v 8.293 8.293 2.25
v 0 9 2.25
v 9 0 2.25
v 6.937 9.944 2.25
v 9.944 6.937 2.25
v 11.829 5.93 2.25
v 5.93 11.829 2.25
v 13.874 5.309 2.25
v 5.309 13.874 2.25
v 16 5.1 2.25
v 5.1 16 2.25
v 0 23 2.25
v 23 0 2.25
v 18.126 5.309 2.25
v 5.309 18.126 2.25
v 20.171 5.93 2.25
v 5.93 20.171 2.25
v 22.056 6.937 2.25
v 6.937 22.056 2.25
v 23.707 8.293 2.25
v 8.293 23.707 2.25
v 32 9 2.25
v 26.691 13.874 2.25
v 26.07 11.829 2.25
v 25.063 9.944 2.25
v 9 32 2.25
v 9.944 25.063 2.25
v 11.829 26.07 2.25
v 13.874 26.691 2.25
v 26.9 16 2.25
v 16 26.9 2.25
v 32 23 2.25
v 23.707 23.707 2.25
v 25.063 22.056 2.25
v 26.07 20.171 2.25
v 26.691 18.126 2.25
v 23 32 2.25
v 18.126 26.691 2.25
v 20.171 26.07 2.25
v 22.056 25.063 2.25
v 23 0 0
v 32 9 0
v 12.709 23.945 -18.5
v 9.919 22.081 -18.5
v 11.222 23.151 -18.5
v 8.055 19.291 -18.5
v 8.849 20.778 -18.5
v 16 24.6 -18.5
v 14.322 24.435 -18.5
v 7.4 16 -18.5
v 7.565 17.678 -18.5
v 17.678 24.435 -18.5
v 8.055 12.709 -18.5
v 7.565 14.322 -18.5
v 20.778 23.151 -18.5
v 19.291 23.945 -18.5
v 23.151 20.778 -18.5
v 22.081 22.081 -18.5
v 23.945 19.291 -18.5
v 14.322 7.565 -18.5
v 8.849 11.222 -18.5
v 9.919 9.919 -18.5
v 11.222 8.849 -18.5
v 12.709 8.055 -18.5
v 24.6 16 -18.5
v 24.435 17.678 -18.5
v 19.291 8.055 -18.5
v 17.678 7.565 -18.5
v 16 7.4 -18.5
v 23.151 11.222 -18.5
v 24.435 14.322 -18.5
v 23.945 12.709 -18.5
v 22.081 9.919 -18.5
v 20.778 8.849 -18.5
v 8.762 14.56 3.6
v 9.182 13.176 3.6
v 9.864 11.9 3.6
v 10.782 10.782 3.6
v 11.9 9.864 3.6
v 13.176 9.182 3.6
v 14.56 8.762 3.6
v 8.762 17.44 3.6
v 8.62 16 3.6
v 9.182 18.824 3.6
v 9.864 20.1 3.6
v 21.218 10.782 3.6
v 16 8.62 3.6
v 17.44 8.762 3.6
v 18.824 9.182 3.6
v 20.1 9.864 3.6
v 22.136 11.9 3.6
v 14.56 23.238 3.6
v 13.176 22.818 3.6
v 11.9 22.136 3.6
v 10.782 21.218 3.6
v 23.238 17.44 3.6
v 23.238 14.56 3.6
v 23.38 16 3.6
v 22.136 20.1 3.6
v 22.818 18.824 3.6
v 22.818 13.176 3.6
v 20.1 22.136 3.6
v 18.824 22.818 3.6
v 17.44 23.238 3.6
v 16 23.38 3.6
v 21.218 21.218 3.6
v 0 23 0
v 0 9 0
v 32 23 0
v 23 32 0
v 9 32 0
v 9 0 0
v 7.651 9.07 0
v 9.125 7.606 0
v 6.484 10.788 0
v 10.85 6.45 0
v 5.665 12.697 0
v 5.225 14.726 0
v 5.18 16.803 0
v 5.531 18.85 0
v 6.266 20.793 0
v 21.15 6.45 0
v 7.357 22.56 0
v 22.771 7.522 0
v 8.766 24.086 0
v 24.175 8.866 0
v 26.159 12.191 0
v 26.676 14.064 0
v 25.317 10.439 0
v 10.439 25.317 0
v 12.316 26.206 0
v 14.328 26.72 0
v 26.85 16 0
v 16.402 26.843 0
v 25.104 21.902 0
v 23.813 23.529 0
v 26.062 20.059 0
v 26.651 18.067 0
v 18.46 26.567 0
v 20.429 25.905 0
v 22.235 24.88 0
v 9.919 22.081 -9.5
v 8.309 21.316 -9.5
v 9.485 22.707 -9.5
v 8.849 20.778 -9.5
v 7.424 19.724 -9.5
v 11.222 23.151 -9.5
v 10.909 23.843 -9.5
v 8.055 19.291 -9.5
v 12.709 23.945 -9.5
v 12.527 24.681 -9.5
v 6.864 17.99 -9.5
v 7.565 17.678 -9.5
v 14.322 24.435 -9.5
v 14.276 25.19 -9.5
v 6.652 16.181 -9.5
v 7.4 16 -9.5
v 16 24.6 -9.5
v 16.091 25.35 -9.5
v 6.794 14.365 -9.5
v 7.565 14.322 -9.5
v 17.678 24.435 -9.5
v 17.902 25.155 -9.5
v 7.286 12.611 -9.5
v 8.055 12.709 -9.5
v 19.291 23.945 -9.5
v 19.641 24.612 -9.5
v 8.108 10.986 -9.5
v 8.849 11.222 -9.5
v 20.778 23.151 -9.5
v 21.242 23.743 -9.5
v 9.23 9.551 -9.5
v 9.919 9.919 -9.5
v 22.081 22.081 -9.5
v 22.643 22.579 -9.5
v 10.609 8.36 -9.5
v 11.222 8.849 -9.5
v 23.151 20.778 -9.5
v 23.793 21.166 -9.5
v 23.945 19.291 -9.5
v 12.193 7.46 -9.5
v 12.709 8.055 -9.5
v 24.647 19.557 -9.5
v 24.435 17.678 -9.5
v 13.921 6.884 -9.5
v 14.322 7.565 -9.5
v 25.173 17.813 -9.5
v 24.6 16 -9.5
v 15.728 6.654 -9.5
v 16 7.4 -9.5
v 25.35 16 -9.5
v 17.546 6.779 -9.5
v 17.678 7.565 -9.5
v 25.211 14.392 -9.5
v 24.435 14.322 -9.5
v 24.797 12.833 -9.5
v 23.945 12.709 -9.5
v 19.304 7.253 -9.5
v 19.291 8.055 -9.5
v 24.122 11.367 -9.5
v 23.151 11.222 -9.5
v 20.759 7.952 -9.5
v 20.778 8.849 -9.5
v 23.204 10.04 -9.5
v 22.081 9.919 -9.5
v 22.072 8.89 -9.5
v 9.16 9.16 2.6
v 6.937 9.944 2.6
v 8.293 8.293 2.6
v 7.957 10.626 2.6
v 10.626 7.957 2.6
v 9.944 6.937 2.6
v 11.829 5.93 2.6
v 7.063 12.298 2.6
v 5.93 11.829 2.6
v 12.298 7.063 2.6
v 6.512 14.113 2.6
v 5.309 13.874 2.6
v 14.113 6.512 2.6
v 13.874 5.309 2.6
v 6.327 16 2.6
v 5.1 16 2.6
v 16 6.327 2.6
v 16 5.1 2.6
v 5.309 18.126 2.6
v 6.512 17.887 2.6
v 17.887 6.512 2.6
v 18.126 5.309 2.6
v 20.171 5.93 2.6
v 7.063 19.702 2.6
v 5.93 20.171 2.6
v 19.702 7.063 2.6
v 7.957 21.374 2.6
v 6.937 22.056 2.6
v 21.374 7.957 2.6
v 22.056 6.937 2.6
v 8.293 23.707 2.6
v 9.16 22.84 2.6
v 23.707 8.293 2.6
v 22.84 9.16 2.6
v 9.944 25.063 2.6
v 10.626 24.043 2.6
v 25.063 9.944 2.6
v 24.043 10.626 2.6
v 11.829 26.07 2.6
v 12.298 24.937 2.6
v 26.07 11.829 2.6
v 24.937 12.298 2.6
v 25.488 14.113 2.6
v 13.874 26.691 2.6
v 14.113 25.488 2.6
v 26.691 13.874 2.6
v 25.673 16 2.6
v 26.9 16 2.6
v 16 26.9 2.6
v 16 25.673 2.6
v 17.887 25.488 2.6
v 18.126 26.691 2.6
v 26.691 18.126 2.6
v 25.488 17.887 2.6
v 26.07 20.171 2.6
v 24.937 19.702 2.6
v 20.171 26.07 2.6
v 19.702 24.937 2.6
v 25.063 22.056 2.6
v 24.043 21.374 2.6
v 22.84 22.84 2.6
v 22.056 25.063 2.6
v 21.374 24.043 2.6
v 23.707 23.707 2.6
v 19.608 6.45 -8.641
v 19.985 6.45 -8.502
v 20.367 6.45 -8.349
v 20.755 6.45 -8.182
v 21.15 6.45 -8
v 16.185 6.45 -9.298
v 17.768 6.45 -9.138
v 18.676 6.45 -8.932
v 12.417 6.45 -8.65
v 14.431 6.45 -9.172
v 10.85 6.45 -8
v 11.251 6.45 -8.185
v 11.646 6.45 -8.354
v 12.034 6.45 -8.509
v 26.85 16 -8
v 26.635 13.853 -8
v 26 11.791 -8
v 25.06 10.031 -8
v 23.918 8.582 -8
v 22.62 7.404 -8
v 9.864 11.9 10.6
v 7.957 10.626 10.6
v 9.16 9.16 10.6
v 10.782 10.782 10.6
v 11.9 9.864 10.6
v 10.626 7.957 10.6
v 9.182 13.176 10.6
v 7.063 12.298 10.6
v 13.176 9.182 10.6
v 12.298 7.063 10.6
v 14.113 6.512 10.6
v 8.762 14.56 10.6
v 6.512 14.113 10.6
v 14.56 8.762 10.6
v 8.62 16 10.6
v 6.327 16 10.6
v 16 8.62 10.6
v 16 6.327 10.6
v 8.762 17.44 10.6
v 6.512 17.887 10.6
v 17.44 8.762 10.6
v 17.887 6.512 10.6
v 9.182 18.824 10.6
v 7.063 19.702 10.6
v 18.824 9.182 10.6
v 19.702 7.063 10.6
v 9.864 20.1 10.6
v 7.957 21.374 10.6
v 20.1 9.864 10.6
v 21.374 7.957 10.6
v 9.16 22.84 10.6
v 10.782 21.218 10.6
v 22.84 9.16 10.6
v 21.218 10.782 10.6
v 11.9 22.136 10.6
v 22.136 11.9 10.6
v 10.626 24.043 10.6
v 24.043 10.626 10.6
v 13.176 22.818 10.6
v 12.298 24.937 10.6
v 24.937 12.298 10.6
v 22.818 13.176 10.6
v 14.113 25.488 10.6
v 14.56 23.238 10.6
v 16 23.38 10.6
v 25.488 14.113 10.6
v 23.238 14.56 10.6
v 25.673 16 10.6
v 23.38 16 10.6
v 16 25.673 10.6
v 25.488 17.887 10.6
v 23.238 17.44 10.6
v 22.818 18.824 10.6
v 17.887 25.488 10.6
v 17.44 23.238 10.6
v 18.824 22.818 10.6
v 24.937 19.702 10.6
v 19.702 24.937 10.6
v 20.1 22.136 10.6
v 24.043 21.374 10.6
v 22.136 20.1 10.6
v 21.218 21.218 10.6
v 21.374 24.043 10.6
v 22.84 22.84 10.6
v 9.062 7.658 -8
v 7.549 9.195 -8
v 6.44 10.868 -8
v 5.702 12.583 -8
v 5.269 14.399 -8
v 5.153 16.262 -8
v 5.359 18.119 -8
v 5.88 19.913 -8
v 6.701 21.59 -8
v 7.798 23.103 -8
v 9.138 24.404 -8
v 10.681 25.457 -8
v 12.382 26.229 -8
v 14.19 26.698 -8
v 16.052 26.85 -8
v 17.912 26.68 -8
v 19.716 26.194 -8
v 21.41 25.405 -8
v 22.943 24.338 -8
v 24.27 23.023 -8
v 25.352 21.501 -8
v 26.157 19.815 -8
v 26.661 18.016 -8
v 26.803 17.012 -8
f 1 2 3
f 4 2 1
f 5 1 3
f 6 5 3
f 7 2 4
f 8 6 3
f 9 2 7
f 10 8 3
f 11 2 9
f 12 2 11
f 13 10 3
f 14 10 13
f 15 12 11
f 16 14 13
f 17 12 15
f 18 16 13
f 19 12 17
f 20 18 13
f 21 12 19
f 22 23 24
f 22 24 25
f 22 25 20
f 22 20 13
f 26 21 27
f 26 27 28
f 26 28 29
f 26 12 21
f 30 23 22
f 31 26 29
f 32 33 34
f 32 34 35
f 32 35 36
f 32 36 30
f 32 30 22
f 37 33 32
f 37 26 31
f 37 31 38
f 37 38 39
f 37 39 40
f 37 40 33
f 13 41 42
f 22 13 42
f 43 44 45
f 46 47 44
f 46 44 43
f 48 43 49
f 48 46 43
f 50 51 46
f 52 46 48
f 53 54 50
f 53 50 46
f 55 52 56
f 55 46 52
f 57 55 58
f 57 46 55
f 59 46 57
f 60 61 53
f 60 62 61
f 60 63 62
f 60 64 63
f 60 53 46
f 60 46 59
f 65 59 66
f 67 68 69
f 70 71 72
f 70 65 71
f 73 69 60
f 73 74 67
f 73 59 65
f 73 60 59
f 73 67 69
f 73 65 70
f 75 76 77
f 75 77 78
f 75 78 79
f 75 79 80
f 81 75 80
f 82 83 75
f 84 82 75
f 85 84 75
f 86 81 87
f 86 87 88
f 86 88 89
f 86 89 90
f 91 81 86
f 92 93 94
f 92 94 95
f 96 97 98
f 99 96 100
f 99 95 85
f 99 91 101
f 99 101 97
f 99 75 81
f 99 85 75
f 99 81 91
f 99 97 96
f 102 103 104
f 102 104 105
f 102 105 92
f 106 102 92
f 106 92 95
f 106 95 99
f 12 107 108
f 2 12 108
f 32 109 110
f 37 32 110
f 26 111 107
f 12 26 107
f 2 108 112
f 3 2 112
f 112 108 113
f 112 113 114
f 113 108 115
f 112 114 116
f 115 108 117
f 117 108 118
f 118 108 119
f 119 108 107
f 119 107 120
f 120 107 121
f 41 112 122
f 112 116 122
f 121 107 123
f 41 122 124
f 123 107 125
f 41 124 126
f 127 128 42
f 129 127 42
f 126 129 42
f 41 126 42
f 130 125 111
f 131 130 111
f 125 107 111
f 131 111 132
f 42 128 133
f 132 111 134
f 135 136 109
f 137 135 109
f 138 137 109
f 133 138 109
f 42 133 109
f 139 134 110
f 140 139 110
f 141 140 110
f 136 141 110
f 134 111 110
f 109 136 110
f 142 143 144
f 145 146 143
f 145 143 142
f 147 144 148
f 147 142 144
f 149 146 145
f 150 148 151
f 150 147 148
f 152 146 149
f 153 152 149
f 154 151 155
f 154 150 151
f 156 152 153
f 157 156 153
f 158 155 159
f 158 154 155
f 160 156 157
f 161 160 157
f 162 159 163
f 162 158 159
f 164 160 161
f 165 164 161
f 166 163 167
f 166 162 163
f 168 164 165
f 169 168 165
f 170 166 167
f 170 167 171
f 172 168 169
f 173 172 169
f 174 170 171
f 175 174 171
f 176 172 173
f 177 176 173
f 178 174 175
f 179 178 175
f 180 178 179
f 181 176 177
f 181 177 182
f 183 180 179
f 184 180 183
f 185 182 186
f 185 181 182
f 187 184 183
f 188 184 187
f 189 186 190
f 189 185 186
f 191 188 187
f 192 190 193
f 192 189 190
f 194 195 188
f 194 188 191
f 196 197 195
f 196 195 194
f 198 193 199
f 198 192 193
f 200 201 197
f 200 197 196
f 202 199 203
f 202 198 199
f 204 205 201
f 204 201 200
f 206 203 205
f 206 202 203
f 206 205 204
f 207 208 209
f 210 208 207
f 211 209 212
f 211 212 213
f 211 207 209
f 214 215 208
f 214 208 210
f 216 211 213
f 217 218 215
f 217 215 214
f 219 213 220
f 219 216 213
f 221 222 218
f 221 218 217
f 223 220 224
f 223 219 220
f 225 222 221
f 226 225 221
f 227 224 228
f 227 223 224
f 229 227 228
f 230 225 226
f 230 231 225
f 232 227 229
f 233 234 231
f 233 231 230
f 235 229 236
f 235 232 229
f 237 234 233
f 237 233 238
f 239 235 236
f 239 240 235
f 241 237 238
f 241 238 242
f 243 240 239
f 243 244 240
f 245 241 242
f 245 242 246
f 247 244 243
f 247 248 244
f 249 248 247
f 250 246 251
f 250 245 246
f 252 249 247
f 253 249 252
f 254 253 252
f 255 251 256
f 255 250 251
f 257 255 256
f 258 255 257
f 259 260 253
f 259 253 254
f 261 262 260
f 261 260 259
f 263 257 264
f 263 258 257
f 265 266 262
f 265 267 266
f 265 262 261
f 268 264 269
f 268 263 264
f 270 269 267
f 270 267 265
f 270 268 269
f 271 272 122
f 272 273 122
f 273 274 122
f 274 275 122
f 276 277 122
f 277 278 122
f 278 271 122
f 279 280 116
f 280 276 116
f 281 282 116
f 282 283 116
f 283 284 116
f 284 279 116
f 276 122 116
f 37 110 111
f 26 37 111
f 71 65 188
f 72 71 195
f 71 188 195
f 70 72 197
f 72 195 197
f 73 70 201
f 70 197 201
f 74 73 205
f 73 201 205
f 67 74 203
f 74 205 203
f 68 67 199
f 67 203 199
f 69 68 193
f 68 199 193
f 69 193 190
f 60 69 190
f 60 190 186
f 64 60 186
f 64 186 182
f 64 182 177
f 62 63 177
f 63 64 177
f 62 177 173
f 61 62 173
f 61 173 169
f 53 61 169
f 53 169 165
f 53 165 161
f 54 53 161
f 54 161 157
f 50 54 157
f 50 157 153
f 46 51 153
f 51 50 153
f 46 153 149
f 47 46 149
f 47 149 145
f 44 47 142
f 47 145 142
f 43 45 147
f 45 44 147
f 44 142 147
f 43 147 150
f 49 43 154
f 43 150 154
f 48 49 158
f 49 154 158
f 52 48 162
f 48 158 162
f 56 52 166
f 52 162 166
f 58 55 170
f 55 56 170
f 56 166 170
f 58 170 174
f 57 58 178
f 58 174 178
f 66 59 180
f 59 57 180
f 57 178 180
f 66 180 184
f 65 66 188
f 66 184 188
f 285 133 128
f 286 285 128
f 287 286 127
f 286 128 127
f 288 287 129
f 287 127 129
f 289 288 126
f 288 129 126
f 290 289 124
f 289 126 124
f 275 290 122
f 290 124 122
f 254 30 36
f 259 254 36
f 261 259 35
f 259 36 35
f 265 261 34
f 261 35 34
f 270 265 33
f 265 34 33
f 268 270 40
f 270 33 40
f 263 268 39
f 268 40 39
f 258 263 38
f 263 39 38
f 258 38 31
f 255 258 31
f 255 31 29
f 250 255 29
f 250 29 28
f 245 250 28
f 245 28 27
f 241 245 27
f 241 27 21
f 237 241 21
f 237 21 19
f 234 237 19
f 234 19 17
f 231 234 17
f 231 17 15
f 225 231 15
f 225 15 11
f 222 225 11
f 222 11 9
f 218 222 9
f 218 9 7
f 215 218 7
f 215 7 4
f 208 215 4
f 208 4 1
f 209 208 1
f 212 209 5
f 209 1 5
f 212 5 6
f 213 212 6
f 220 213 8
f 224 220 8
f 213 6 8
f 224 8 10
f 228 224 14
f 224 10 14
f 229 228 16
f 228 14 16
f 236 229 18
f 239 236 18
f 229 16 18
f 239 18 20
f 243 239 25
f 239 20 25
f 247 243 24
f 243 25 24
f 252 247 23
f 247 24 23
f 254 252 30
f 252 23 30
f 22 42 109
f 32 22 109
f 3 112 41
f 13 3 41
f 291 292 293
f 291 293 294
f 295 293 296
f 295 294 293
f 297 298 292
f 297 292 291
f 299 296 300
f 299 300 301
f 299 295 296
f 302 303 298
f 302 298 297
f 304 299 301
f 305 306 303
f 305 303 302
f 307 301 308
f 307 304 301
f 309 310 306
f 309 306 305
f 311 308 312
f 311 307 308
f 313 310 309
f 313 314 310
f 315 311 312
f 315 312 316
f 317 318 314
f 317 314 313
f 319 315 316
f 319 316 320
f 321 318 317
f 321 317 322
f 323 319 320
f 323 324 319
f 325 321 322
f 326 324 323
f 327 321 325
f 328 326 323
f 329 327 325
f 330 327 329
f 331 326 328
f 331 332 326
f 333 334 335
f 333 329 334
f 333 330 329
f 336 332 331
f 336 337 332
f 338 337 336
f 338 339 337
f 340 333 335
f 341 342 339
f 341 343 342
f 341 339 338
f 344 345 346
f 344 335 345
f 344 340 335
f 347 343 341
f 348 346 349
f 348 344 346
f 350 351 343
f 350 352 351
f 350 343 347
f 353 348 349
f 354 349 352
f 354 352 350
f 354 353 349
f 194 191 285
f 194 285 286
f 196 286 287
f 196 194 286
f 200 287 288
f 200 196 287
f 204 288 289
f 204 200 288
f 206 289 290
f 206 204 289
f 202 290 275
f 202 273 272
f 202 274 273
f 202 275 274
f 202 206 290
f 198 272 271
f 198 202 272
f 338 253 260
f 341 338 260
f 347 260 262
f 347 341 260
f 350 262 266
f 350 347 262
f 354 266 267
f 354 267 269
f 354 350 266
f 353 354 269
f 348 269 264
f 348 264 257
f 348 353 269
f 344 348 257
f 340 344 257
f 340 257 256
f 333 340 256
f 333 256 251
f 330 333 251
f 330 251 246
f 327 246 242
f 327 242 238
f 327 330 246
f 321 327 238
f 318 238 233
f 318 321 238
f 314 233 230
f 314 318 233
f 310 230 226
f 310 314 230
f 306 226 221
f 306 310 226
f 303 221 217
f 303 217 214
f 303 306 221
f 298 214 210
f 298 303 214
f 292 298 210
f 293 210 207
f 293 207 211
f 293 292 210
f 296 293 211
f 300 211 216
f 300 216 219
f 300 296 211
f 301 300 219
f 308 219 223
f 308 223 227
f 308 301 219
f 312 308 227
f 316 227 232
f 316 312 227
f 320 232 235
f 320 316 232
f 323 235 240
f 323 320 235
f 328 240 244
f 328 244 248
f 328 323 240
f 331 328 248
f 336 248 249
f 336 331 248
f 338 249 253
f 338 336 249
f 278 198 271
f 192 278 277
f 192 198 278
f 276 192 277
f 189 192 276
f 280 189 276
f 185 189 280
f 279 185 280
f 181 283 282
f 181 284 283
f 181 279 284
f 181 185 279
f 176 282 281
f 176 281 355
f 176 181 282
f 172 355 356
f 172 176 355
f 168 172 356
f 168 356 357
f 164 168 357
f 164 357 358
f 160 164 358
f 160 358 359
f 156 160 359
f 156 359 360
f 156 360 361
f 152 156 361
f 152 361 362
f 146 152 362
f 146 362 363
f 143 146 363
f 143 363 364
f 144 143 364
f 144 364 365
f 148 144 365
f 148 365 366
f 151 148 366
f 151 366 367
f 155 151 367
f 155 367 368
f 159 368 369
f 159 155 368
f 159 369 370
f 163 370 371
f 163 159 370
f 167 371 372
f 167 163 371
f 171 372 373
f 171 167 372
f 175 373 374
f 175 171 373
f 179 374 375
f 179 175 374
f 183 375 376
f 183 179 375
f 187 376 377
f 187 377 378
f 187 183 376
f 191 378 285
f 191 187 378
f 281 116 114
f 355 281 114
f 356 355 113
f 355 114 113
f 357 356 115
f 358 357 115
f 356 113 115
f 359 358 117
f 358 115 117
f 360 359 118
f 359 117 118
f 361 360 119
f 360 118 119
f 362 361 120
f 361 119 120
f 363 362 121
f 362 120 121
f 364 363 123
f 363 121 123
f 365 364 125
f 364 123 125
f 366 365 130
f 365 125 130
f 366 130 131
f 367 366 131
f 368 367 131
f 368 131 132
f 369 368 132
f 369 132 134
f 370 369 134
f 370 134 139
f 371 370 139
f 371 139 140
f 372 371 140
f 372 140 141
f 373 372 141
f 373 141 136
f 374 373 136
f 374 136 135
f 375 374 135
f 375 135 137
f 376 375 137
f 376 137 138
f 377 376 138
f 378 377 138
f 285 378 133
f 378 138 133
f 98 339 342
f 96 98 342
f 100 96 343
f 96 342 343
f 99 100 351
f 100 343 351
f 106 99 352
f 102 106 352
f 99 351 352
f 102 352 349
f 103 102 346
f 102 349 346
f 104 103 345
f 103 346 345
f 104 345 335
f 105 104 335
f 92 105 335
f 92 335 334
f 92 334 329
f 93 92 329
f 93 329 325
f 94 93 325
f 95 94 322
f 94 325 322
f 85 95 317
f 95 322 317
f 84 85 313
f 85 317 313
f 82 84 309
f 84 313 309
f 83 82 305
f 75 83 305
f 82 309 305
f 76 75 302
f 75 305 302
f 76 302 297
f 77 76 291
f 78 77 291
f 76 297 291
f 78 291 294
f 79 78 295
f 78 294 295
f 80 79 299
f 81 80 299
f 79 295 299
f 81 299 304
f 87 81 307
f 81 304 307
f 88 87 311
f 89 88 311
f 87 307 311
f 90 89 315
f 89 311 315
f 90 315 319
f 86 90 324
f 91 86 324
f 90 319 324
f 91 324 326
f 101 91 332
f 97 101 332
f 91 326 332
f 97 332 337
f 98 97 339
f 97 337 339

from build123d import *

# Parameters (mm, degrees)
F1_DEPTH    = 2.25
F2_R        = 10.9
F3_DEPTH    = 10.6
F5_DEPTH    = 9.5
F6_T2_ANGLE = 290.6956436441
F6_T4_ANGLE = 110.5630137602
F7_R        = 8.6
F8_DEPTH    = 10
F9_R        = 7.38
F10_DEPTH   = 7
F11_R       = 10.9
F11_R_2     = 9.6734059383
F12_DEPTH   = 8
F13_R       = 9.5
F14_DEPTH   = 1


# Not quite as in the source:
# - a fillet or chamfer that OpenCascade refuses, or shapes differently, is made with other operations: its cross-section is extruded or revolved along the edge and cut away or added


with BuildPart() as f1:
    # F0 (on Top) → F1 (new body)
    with BuildSketch(Plane.XY):
        Polygon((0, 9), (9, 0), (23, 0), (32, 9), (32, 23), (23, 32), (9, 32), (0, 23), align=None)
    extrude(amount=F1_DEPTH)

    # F2 (on Top) → F3 (join)
    with BuildSketch(Plane.XY):
        with Locations((16, 16)):
            Circle(F2_R)
    extrude(amount=F3_DEPTH)

    # F4 (on face) → F5 (join)
    with BuildSketch(Plane(origin=(0, 0, 0), x_dir=(1, 0, 0), z_dir=(0, 0, -1))):
        with BuildLine():
            ThreePointArc((10.8502427242, -6.45), (10.4390813008, -25.3165810908), (26.85, -16))
            ThreePointArc((26.85, -16), (25.3165810908, -10.4390813008), (21.1497572758, -6.45))
            Line((21.1497572758, -6.45), (10.8502427242, -6.45))
        make_face()
    extrude(amount=F5_DEPTH)

    # F6: chamfer of 1.5 on 2 edges, made by hand

    # F6_s1 → F6_t2 (revolve, cut)
    with BuildSketch(Plane(origin=(19.2912753227, 7.2878893438, 0), x_dir=(0, 0, 1), z_dir=(0.9354709038, 0.3534037184, 0))):
        with BuildLine():
            Line((-7.9575735931, 1.5793514401), (-9.5424264069, -0.0055013736))
            Line((-9.5424264069, -0.0055013736), (-9.5724264069, -0.0055013736))
            ThreePointArc((-9.5724264069, -0.0055013736), (-9.53, 0.7657118298), (-9.53, 1.5369250333))
            Line((-9.53, 1.5369250333), (-9.5, 1.5669250333))
            ThreePointArc((-9.5, 1.5669250333), (-8.7287867966, 1.5669250333), (-7.9575735931, 1.6093514401))
            Line((-7.9575735931, 1.6093514401), (-7.9575735931, 1.5793514401))
        make_face()
    revolve(axis=Axis((16, 16, -9.5), (0, 0, -1)), revolution_arc=F6_T2_ANGLE, mode=Mode.SUBTRACT)

    # F6_s3 → F6_t4 (revolve, cut)
    with BuildSketch(Plane.XZ.offset(-16)):
        with BuildLine():
            Line((26.8924264069, -7.9575735931), (25.3075735931, -9.5424264069))
            Line((25.3075735931, -9.5424264069), (25.3075735931, -9.5724264069))
            ThreePointArc((25.3075735931, -9.5724264069), (26.0787867966, -9.53), (26.85, -9.53))
            Line((26.85, -9.53), (26.88, -9.5))
            ThreePointArc((26.88, -9.5), (26.88, -8.7287867966), (26.9224264069, -7.9575735931))
            Line((26.9224264069, -7.9575735931), (26.8924264069, -7.9575735931))
        make_face()
    revolve(axis=Axis((16, 16, -9.5), (0, 0, -1)), revolution_arc=F6_T4_ANGLE, mode=Mode.SUBTRACT)

    # F7 (on face) → F8 (join)
    with BuildSketch(Plane(origin=(0, 0, -9.5), x_dir=(1, 0, 0), z_dir=(0, 0, -1))):
        with Locations((16, -16)):
            Circle(F7_R)
    extrude(amount=F8_DEPTH)

    # F9 (on face) → F10 (cut)
    with BuildSketch(Plane.XY.offset(10.6)):
        with Locations((16, 16)):
            Circle(F9_R)
    extrude(amount=-F10_DEPTH, mode=Mode.SUBTRACT)

    # F11 (on face) → F12 (cut)
    with BuildSketch(Plane.XY.offset(10.6)):
        with Locations((16, 16)):
            Circle(F11_R)
        with Locations((16, 16)):
            Circle(F11_R_2, mode=Mode.SUBTRACT)
    extrude(amount=-F12_DEPTH, mode=Mode.SUBTRACT)

    # F13 (on face) → F14 (cut)
    with BuildSketch(Plane(origin=(0, 0, -19.5), x_dir=(1, 0, 0), z_dir=(0, 0, -1))):
        with Locations((16, -16)):
            Circle(F13_R)
    extrude(amount=-F14_DEPTH, mode=Mode.SUBTRACT)


solid = f1.part
